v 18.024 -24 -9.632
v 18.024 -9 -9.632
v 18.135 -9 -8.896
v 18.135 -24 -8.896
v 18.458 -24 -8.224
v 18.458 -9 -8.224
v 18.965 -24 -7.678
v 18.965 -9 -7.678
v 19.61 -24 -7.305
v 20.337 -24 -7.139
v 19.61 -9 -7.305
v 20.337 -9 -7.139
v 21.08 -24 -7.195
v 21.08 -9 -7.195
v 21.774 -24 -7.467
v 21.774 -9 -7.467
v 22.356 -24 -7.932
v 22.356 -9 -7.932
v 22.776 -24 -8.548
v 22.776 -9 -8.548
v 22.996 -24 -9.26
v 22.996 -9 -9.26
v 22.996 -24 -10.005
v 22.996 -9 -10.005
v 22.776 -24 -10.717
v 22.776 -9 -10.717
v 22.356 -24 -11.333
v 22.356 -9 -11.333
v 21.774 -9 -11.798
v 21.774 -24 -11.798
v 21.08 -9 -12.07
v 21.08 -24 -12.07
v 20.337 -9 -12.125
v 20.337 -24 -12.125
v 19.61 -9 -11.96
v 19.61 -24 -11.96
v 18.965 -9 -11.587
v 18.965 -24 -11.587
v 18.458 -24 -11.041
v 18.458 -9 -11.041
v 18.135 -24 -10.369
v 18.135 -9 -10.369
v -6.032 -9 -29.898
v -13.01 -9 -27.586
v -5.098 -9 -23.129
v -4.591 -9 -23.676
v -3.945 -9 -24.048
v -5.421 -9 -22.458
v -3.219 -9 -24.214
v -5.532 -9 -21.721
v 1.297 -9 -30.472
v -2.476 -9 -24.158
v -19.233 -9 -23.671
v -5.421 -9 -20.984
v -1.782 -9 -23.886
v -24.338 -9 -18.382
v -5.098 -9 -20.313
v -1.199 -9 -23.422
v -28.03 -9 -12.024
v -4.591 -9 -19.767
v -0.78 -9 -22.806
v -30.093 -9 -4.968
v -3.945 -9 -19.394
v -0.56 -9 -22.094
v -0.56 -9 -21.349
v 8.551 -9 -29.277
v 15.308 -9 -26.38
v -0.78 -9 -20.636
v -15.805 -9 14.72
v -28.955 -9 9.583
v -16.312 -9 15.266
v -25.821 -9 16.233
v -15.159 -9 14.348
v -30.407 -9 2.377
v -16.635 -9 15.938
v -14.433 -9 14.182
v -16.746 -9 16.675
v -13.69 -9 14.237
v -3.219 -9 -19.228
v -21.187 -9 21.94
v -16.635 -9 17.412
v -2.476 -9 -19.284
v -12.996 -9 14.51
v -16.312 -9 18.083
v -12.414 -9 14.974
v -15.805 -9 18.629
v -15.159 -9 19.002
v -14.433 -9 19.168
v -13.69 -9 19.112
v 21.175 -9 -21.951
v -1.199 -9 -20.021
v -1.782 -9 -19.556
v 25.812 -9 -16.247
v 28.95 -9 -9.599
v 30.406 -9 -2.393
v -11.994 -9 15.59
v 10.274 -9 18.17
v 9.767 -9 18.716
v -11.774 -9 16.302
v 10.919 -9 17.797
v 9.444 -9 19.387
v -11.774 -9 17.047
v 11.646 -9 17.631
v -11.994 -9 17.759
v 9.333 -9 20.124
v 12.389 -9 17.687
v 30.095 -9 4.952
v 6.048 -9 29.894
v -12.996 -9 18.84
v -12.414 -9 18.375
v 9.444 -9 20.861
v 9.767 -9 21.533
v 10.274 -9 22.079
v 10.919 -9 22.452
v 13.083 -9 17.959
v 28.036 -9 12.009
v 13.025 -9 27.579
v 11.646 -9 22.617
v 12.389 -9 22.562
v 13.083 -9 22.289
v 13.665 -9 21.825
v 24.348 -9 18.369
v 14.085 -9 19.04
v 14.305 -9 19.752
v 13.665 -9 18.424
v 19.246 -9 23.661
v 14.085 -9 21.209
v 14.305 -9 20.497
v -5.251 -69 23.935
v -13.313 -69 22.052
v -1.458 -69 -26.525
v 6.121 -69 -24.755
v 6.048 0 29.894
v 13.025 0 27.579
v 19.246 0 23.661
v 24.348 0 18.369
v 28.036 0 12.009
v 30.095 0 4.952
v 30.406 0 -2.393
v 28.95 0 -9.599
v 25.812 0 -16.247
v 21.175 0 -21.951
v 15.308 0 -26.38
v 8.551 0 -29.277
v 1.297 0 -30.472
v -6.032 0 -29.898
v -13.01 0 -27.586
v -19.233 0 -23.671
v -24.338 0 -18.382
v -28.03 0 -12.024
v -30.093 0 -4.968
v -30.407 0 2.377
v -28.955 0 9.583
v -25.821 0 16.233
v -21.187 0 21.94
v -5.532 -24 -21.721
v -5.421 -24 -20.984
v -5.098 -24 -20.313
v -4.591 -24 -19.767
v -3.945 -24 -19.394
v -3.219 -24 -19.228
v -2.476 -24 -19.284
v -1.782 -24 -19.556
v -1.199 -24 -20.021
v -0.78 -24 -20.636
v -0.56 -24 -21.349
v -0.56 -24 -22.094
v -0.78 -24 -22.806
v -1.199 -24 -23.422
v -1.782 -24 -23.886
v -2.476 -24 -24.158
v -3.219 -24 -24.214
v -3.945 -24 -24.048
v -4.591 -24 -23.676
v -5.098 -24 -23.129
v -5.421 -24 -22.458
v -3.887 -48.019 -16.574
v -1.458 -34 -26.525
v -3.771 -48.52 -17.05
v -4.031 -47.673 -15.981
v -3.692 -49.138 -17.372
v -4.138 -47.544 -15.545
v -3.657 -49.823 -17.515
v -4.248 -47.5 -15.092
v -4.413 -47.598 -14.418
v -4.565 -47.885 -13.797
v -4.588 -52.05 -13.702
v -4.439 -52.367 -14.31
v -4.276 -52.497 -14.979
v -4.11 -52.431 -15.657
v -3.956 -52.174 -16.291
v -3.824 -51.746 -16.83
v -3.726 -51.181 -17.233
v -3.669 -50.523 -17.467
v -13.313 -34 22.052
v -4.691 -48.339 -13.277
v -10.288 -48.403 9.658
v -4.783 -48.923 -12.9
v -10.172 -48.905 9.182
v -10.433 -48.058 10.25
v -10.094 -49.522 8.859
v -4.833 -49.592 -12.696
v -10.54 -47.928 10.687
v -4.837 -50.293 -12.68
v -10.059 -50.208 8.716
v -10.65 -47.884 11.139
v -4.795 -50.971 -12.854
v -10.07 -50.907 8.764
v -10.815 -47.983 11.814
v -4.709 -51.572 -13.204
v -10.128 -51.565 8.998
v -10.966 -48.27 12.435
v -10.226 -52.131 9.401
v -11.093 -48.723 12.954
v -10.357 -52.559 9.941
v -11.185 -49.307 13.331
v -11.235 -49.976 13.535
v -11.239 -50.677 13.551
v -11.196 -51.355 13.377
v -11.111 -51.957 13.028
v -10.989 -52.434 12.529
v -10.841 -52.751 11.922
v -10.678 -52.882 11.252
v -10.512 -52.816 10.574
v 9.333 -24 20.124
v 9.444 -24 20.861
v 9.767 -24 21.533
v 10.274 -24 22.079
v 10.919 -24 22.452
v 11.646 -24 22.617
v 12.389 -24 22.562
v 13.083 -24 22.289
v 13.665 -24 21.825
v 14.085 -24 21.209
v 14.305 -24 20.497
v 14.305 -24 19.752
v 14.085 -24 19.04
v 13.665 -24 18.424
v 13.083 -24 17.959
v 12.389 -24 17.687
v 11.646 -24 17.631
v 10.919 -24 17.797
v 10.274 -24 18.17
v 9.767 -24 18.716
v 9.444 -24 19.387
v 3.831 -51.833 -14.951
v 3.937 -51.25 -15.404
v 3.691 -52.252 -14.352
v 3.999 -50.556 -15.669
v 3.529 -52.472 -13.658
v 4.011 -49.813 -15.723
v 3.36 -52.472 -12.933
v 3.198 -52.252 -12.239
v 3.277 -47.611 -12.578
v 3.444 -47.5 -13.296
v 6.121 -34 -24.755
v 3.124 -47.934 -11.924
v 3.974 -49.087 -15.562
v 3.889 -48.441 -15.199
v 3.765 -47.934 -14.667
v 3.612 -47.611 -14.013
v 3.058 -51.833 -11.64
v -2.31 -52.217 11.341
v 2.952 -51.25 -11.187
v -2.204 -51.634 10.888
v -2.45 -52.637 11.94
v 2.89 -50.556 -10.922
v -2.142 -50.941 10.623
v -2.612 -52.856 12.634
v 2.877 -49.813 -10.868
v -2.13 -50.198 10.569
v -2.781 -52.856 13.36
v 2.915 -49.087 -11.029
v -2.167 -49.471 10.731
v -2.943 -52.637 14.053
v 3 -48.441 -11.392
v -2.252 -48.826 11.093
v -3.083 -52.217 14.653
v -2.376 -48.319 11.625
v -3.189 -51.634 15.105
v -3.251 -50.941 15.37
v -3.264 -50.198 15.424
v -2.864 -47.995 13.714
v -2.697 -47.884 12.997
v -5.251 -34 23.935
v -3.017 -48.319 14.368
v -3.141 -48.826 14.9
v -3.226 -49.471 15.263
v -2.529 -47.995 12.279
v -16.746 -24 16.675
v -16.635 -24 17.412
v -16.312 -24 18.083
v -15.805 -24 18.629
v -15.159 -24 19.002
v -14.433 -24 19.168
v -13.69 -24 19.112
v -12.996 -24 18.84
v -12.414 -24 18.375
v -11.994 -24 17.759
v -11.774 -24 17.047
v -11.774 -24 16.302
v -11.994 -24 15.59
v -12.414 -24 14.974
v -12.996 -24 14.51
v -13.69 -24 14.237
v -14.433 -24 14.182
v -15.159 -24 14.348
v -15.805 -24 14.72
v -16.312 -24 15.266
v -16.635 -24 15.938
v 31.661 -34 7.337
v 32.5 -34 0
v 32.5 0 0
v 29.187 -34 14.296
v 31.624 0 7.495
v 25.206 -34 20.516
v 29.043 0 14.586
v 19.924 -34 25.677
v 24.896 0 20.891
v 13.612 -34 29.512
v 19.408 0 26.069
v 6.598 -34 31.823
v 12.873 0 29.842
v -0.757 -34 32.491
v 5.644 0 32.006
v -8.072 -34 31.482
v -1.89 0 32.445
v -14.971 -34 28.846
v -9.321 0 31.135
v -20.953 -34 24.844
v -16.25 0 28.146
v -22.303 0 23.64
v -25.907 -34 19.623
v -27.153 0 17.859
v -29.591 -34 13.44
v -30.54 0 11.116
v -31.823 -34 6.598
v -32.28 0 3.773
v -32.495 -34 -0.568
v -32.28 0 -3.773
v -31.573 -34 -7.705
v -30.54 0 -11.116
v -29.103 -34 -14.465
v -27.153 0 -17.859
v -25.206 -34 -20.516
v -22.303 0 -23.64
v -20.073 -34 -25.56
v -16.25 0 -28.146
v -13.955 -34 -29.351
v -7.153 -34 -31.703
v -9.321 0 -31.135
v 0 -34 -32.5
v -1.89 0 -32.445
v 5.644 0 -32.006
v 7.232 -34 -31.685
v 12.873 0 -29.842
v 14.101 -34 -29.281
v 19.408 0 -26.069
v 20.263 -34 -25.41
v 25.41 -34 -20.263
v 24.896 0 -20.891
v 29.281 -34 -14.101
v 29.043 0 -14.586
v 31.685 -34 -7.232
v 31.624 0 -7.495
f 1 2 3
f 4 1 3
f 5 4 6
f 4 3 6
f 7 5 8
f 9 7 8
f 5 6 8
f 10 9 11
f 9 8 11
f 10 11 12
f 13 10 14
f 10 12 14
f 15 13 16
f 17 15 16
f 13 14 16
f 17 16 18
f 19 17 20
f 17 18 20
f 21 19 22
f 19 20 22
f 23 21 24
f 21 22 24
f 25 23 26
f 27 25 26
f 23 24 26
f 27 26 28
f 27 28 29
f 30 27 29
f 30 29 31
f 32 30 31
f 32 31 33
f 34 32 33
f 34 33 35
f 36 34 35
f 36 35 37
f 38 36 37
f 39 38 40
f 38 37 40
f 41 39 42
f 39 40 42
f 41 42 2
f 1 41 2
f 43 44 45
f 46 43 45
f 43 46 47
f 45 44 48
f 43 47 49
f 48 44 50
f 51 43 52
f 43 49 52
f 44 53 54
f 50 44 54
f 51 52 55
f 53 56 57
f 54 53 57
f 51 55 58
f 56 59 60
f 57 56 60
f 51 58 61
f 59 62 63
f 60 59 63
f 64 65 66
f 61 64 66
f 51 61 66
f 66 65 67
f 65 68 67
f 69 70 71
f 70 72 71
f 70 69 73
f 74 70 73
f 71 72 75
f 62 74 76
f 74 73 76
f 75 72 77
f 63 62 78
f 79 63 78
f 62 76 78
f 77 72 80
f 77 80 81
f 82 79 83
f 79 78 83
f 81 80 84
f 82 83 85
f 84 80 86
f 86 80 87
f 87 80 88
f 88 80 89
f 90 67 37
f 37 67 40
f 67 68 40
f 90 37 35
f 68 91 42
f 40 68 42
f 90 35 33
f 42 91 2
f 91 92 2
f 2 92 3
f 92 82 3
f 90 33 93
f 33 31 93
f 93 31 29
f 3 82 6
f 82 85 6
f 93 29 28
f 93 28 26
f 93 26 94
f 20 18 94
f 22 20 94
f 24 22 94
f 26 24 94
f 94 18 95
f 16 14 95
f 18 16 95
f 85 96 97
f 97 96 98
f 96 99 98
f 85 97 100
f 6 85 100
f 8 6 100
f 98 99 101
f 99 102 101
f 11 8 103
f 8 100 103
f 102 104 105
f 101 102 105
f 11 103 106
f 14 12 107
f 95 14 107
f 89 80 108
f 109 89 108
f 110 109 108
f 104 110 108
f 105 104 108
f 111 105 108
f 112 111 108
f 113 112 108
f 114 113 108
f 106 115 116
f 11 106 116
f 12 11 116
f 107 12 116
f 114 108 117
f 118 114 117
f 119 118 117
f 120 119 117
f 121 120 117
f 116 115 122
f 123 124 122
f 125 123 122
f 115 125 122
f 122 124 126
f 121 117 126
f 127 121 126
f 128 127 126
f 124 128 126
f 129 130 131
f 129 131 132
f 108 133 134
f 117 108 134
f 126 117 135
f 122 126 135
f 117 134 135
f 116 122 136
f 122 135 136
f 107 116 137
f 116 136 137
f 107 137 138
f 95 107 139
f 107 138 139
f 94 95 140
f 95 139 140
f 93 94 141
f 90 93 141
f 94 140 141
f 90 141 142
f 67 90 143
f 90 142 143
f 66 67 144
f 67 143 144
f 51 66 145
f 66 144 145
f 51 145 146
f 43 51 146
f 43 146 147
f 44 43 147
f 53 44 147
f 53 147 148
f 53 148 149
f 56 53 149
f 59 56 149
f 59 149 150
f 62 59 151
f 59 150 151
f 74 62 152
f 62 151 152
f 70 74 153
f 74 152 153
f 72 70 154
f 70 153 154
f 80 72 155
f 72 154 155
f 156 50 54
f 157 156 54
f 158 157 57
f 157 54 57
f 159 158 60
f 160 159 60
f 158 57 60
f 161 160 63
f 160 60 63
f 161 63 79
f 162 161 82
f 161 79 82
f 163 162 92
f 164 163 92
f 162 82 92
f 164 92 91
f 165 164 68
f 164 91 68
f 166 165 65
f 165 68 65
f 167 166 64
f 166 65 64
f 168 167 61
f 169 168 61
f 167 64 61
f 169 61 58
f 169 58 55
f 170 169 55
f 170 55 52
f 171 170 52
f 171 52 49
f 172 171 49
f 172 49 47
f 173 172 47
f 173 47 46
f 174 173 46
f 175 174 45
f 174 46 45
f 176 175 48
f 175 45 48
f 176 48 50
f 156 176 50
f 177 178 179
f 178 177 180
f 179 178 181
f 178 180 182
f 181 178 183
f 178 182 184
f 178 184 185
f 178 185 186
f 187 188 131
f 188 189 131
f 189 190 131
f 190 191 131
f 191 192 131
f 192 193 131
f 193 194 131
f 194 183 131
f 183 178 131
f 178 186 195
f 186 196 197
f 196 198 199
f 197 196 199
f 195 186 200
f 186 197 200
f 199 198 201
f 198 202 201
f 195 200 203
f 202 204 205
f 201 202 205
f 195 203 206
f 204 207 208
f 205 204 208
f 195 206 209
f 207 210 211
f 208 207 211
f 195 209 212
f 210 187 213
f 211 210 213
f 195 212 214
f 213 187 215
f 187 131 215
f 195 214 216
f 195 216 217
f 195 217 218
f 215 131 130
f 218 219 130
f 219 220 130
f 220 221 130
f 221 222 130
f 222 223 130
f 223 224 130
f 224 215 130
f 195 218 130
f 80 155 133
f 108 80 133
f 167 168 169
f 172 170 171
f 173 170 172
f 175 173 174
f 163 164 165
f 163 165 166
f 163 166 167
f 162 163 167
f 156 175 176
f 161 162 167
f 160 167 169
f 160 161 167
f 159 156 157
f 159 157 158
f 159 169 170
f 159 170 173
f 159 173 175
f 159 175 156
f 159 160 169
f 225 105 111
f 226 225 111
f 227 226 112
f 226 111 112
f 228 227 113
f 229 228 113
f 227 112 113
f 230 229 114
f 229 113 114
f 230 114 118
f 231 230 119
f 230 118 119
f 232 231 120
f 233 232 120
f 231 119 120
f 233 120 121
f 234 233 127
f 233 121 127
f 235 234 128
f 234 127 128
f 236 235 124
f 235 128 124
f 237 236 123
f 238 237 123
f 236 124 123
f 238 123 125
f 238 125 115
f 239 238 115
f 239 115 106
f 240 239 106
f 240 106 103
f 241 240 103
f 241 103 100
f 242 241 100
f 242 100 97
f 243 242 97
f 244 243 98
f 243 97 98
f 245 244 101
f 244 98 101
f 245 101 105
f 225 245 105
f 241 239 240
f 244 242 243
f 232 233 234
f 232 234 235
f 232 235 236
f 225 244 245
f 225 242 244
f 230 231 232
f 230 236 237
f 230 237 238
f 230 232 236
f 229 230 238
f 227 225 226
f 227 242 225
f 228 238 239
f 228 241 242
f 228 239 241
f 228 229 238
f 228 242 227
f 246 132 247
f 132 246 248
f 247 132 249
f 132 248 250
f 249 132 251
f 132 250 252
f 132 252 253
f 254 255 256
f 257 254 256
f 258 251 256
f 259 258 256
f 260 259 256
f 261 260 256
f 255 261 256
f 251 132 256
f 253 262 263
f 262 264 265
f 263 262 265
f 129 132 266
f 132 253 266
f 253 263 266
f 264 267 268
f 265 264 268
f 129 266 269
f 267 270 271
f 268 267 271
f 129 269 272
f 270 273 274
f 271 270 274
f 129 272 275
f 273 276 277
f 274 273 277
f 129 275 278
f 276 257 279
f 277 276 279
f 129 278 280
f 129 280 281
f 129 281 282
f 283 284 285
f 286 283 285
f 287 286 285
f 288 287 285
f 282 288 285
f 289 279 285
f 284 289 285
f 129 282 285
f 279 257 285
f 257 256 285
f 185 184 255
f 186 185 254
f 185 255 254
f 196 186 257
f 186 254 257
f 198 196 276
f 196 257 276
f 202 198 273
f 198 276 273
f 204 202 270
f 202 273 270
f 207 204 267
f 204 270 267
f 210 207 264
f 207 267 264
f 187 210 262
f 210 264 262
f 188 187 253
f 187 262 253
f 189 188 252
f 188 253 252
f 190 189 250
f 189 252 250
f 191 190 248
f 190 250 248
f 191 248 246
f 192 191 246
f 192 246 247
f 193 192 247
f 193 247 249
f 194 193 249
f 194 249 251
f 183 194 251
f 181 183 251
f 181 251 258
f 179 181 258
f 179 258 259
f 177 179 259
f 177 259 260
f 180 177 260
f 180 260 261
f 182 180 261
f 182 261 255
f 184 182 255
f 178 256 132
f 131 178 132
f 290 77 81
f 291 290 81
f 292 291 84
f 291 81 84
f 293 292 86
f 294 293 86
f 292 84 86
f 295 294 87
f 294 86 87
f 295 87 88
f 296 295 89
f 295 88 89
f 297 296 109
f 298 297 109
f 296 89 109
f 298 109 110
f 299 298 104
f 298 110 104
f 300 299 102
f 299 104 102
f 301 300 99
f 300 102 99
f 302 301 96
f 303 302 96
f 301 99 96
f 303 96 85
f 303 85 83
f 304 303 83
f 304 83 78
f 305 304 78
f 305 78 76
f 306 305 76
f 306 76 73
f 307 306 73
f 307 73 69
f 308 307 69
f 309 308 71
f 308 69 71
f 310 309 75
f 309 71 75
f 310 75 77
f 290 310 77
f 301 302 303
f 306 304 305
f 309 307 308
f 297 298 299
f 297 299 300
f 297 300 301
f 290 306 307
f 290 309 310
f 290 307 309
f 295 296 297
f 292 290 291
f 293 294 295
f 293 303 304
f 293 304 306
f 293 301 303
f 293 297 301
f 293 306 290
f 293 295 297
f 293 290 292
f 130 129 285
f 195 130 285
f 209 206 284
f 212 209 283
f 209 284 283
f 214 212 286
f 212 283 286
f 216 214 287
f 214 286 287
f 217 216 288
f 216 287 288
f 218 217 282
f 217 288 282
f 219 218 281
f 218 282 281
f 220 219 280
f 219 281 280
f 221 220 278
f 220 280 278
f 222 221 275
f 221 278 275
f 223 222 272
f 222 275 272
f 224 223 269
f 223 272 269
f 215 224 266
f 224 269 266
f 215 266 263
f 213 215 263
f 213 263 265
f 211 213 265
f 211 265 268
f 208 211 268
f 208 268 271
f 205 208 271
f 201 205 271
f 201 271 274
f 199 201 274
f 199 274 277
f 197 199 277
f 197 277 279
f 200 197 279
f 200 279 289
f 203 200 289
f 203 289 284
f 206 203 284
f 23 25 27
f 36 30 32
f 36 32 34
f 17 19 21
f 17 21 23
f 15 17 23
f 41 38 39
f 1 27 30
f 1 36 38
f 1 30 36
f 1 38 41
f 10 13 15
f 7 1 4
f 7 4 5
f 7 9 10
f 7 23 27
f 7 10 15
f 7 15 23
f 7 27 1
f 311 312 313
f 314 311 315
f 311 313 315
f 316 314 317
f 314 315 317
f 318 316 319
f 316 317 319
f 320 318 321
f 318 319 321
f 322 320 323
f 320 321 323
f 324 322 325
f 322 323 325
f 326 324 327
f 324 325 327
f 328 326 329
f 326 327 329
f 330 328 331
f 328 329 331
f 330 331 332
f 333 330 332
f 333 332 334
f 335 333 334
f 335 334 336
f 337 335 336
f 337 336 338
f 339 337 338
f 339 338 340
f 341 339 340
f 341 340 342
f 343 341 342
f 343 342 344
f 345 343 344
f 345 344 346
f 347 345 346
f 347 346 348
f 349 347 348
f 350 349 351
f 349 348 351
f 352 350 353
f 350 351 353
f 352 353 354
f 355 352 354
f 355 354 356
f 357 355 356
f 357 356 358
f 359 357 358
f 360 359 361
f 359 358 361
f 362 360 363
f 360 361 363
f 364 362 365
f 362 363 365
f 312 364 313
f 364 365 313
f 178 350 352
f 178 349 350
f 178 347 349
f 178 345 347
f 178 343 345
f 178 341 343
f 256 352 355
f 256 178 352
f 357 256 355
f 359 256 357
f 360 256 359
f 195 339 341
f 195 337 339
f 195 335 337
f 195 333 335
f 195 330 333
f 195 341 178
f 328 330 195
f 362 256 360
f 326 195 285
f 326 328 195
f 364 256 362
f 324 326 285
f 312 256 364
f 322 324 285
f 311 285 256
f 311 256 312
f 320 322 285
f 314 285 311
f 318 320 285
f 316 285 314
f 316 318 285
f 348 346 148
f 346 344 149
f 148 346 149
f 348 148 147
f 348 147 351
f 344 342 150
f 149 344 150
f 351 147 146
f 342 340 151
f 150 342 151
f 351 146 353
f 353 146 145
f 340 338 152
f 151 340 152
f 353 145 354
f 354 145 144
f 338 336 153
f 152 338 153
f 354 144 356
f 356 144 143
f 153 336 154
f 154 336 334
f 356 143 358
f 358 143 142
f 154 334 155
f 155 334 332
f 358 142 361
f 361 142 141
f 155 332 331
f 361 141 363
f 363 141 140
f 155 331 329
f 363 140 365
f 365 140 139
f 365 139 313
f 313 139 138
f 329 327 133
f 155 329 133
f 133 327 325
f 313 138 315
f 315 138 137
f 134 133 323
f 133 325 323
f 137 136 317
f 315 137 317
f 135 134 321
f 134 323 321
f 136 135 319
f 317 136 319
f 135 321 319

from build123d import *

# Parameters (mm, degrees)
F0_R      = 32.5
F1_DEPTH  = 9
F2_R      = 32.5
F3_DEPTH  = 25
F6_DEPTH  = 35
F8_DEPTH  = 35
F10_DEPTH = 25
F11_R     = 2.5
F12_DEPTH = 25
F13_R     = 2.5
F14_DEPTH = 15


with BuildPart() as f1:
    # F0 (on Front) → F1 (new body)
    with BuildSketch(Plane.XZ):
        Circle(F0_R)
        with BuildLine():
            ThreePointArc((6.0477952292, 29.8943836341), (8.5507887297, -29.2768511302), (-21.1868965868, 21.9400413177))
            Line((-21.1868965868, 21.9400413177), (6.0477952292, 29.8943836341))
        make_face(mode=Mode.SUBTRACT)
    extrude(amount=F1_DEPTH)

    # F2 (on face) → F3 (join)
    with BuildSketch(Plane.XZ.offset(9)):
        Circle(F2_R)
    extrude(amount=F3_DEPTH)

    # F5 (on face) → F6 (join)
    with BuildSketch(Plane.XZ.offset(34)):
        with BuildLine():
            Line((7.7129205553, -31.5715197054), (-7.0699844214, 31.7216853317))
            ThreePointArc((-7.0699844214, 31.7216853317), (-31.6482352223, -7.3918338264), (7.7129205553, -31.5715197054))
        make_face()
    extrude(amount=F6_DEPTH)

    # F7 (on face) → F8 (cut)
    with BuildSketch(Plane.XZ.offset(69)):
        with BuildLine():
            Line((0, -32.5), (-14.9713811536, 28.8462778596))
            ThreePointArc((-14.9713811536, 28.8462778596), (-31.5733592641, -7.705386738), (0, -32.5))
        make_face()
    extrude(amount=-F8_DEPTH, mode=Mode.SUBTRACT)

    # F9 (on face) → F10 (cut)
    with BuildSketch(Plane(origin=(0.321468067, 0, 0.0750828131), x_dir=(0, 1, 0), z_dir=(0.973791853, 0, 0.2274410408))):
        Polygon((-34, -40.3801463544), (-34, -32.4983233545), (-34, -25.4983233545), (-69, -25.4983233545), (-69, -32.4983233545), (-69, -40.3801463544), align=None)
        Polygon((-69, 32.4983233545), (-69, 24.5016766455), (-34, 24.5016766455), (-34, 32.4983233545), (-34, 45.2751591802), (-69, 45.2751591802), align=None)
    extrude(amount=-F10_DEPTH, mode=Mode.SUBTRACT)

    # F11 (on face) → F12 (cut)
    with BuildSketch(Plane(origin=(0.321468067, 0, 0.0750828131), x_dir=(0, 1, 0), z_dir=(0.973791853, 0, 0.2274410408))):
        with Locations((-50, -13.7305416178)):
            Circle(F11_R)
        with Locations((-50.3844208735, 13.2694583822)):
            Circle(F11_R)
    extrude(amount=-F12_DEPTH, mode=Mode.SUBTRACT)

    # F13 (on face) → F14 (cut)
    with BuildSketch(Plane(origin=(0, -9, 0), x_dir=(-1, 0, 0), z_dir=(0, 1, 0))):
        with Locations((-20.5235508249, -9.6324379852)):
            Circle(F13_R)
        with Locations((-11.8325852307, 20.1243615242)):
            Circle(F13_R)
        with Locations((14.2461454022, 16.6747516077)):
            Circle(F13_R)
        with Locations((3.0319962484, -21.7211187269)):
            Circle(F13_R)
    extrude(amount=-F14_DEPTH, mode=Mode.SUBTRACT)


solid = f1.part
